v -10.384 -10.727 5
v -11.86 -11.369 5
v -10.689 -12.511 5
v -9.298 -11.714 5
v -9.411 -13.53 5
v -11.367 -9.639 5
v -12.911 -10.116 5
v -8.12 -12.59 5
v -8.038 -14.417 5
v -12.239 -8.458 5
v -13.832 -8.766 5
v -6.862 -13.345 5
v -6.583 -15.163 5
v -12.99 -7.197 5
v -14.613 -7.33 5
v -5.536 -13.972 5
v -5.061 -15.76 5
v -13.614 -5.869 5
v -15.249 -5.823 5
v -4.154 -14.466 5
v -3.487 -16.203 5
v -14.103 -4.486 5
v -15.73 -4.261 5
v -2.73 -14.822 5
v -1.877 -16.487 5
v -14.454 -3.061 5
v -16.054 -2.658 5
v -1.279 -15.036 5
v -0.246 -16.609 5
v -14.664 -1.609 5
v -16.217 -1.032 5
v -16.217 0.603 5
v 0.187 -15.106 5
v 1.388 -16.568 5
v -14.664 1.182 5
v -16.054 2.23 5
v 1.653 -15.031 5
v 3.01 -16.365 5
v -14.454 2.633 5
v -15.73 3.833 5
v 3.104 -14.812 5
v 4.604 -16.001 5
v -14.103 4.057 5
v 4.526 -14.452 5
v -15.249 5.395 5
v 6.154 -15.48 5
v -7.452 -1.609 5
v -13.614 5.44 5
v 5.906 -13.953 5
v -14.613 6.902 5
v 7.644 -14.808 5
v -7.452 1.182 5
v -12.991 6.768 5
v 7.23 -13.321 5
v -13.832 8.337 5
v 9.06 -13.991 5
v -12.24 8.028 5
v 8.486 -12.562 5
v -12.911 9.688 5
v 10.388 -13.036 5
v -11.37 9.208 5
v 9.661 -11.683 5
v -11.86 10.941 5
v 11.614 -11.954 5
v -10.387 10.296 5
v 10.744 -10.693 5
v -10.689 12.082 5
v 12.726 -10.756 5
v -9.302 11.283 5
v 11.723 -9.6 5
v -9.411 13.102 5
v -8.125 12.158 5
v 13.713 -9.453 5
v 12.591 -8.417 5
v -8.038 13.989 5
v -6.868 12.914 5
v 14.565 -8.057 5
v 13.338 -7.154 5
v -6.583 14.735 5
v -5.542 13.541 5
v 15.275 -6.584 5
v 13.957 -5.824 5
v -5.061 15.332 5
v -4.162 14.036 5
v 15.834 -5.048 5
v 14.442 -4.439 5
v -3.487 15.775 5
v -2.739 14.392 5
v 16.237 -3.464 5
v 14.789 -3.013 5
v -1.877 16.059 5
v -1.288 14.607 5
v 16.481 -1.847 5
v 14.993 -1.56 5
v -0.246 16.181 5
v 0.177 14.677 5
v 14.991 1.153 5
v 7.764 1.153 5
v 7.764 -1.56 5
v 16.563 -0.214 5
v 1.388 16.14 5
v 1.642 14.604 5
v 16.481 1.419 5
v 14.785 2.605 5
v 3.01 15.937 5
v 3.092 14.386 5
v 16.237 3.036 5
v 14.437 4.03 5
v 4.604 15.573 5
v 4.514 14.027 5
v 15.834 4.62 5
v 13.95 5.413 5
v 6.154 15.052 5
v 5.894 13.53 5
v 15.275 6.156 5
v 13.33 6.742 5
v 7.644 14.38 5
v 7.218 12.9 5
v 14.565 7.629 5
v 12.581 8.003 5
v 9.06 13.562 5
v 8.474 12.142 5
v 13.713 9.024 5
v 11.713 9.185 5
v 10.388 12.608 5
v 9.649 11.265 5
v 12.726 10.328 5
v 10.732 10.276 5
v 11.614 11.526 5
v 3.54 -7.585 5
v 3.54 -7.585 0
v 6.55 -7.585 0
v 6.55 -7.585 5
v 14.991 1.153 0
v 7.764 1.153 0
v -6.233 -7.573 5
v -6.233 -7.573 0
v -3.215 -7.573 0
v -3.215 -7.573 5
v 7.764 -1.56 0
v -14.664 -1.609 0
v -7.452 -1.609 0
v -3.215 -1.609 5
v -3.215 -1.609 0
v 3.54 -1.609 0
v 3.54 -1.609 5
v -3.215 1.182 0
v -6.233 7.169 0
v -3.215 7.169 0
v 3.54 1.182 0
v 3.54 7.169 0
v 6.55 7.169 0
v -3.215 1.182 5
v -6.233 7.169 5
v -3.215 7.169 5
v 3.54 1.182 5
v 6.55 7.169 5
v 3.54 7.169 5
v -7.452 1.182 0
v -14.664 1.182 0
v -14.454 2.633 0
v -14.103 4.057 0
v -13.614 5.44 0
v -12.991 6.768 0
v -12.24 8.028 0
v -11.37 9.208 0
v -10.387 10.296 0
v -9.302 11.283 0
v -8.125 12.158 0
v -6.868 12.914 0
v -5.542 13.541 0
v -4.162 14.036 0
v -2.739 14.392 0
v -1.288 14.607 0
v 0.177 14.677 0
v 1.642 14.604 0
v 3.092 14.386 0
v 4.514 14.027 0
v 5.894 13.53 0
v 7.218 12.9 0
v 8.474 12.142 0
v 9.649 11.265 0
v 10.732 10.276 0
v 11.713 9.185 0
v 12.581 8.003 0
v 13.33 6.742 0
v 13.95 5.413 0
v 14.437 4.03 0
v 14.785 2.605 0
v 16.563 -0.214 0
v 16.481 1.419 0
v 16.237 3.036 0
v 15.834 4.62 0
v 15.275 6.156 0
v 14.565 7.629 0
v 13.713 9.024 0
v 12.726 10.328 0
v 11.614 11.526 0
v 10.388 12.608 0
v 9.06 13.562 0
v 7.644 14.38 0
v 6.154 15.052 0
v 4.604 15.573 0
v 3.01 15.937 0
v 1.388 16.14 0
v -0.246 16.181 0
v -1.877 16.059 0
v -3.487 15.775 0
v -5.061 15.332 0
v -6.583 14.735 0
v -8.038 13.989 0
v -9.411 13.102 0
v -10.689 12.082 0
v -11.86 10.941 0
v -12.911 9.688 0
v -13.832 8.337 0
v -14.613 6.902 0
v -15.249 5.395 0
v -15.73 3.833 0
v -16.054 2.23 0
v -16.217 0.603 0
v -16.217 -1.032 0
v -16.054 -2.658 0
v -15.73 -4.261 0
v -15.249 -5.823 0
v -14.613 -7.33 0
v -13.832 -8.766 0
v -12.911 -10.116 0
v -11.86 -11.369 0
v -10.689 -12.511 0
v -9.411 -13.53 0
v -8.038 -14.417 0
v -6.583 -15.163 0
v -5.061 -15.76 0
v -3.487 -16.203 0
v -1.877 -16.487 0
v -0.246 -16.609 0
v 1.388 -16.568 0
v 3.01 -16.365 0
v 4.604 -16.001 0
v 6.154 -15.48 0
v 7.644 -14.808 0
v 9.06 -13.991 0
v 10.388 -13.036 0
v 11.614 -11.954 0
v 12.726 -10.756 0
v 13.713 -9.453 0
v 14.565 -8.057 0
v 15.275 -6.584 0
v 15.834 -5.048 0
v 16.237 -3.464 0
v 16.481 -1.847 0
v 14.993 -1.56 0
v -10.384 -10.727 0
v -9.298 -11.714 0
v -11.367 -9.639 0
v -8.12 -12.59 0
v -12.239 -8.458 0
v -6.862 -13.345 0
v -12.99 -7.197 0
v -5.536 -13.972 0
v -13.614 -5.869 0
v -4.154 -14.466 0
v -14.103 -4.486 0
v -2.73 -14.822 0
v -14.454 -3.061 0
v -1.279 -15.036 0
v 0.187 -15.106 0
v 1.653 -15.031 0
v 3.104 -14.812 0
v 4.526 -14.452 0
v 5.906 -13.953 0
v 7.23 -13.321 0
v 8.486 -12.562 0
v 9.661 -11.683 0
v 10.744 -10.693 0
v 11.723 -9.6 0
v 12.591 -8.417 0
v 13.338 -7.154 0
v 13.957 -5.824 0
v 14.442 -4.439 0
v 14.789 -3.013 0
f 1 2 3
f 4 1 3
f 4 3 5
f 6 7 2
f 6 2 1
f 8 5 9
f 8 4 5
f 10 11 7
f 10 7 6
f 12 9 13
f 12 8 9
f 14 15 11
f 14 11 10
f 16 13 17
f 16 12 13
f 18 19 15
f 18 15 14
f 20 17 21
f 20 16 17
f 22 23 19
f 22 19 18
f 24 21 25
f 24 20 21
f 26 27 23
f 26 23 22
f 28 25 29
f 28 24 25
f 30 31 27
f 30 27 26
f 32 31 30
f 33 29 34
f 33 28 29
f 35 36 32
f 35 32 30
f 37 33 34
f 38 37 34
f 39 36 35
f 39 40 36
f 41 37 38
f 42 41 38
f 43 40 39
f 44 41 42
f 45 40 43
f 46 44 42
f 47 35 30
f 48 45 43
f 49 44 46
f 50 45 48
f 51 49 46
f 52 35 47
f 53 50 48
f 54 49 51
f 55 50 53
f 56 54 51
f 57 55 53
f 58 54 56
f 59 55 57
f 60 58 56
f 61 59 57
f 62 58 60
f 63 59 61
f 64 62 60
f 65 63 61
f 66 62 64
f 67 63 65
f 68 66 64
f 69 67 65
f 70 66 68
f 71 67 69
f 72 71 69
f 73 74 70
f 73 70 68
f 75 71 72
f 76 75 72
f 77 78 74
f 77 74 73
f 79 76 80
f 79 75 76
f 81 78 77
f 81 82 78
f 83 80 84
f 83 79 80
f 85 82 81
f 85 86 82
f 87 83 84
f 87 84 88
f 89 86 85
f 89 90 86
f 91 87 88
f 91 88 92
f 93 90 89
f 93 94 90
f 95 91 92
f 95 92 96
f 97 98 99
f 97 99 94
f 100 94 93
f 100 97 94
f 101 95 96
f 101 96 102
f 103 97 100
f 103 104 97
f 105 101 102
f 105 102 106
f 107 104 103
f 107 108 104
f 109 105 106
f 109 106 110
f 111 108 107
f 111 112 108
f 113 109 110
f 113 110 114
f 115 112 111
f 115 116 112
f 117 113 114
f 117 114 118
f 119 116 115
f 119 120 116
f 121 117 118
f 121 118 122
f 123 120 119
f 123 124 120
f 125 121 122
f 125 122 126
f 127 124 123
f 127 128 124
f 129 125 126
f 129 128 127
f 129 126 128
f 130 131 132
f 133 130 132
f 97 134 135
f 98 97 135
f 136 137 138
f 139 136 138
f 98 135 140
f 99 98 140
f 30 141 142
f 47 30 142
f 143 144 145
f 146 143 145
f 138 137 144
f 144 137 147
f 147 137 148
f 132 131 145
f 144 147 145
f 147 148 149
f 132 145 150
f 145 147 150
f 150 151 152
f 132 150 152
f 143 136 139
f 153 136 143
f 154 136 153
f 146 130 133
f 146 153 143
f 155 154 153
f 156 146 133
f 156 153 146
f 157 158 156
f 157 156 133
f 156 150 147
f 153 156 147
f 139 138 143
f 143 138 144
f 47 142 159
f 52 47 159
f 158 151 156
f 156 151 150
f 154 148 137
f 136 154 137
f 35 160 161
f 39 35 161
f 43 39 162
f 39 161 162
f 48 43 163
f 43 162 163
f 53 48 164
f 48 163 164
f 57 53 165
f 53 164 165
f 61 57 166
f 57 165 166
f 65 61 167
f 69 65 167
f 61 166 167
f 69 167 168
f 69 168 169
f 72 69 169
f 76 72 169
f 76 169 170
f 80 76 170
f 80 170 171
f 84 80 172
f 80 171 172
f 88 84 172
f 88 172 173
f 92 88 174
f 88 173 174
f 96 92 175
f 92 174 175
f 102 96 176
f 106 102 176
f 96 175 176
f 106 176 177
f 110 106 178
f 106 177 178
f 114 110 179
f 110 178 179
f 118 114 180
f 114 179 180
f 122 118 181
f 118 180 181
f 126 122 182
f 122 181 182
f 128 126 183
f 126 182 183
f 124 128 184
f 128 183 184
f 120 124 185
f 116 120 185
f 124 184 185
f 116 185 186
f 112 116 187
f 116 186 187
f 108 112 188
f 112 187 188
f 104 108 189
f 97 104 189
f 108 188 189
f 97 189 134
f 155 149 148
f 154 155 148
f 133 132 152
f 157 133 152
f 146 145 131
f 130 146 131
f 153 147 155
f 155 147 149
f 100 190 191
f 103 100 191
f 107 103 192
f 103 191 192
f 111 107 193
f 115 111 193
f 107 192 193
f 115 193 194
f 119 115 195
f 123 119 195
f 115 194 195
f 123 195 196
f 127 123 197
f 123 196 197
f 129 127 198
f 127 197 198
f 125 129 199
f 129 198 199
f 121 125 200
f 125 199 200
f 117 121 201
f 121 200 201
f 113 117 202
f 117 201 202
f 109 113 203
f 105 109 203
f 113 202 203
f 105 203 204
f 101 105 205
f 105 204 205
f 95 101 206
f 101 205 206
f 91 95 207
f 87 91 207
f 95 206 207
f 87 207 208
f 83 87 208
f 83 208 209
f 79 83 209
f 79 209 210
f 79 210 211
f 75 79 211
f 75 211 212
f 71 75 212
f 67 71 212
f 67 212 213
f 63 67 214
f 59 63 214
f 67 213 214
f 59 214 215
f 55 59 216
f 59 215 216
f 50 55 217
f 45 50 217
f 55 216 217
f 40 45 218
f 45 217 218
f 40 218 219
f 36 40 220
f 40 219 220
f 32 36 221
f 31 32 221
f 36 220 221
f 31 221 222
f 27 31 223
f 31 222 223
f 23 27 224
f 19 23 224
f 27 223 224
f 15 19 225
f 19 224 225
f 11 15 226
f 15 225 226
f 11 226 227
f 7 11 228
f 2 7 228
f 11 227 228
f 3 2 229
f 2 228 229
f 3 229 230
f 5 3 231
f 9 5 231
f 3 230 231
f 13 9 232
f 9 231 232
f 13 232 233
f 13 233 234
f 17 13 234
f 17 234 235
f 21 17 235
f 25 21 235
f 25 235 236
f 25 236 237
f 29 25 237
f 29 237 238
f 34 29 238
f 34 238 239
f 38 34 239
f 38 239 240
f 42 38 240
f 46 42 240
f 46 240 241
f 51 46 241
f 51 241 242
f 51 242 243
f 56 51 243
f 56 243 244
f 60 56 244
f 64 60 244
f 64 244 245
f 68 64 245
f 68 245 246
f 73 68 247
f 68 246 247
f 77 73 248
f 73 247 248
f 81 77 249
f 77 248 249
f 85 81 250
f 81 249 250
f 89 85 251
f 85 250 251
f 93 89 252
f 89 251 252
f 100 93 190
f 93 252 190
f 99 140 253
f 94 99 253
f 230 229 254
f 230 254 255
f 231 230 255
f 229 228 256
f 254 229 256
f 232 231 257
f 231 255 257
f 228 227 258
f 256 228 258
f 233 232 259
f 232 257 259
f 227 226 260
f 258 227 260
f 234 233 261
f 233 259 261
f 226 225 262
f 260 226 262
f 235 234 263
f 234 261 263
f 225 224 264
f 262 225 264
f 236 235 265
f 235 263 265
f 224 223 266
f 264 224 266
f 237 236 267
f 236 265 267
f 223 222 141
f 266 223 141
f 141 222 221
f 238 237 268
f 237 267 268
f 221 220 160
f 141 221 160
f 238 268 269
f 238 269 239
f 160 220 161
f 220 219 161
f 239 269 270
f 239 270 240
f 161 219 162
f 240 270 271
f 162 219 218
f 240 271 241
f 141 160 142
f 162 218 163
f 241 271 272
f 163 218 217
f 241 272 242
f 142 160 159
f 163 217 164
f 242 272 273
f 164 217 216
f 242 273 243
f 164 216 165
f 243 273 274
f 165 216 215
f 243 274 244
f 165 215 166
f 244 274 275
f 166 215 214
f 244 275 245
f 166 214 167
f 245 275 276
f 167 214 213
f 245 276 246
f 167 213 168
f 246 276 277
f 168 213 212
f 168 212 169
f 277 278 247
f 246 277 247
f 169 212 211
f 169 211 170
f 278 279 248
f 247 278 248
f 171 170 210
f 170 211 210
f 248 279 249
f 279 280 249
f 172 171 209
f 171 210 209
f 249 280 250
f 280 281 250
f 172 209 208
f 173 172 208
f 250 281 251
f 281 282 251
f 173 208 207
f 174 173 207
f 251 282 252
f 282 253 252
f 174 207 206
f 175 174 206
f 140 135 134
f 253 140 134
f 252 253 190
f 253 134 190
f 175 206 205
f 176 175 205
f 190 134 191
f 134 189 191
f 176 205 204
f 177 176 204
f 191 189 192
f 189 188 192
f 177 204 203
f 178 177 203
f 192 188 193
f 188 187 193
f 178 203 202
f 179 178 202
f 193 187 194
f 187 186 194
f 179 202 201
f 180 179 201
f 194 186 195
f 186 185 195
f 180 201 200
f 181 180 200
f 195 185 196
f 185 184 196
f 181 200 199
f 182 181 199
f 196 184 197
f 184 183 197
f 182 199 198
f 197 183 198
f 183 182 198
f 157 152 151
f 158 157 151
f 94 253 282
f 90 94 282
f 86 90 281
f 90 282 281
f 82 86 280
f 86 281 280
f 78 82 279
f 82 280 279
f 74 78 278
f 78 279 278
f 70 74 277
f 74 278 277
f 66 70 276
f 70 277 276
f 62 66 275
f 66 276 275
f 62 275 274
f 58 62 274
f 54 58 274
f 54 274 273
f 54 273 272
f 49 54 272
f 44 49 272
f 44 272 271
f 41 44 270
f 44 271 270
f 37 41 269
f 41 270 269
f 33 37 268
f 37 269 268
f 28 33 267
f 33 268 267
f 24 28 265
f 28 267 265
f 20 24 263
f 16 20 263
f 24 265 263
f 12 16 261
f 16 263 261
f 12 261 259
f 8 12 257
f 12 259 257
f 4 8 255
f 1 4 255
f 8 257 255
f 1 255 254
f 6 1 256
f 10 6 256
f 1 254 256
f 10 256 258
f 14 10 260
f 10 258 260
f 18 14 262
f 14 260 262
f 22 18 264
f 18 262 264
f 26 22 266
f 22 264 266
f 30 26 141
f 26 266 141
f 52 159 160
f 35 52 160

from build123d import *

# Parameters (mm, degrees)
F0_R     = 16.400052
F1_DEPTH = 5


with BuildPart() as f1:
    # F0 (on Top) → F1 (new body)
    with BuildSketch(Plane.XY):
        with Locations((0.162477, -0.214076)):
            Circle(F0_R)
        with BuildLine():
            ThreePointArc((14.991158, 1.152792), (15.038298, 0.47008), (15.054022, -0.214076))
            ThreePointArc((15.054022, -0.214076), (15.038785, -0.887567), (14.993103, -1.55968))
            ThreePointArc((14.993103, -1.55968), (0.187112, -15.105601), (-14.663615, -1.60874))
            ThreePointArc((-14.663615, -1.60874), (-14.729068, -0.213591), (-14.663524, 1.181554))
            ThreePointArc((-14.663524, 1.181554), (0.176921, 14.677462), (14.991158, 1.152792))
        make_face(mode=Mode.SUBTRACT)
        Polygon((-3.215072, -7.572618), (-3.215072, -1.60874), (3.540387, -1.60874), (3.540387, -7.585416), (6.550414, -7.585416), (6.550414, 7.16865), (3.540387, 7.16865), (3.540387, 1.181554), (-3.215072, 1.181554), (-3.215072, 7.16865), (-6.232549, 7.16865), (-6.232549, -7.572618), align=None)
        with BuildLine():
            ThreePointArc((14.993103, -1.55968), (15.038785, -0.887567), (15.054022, -0.214076))
            ThreePointArc((15.054022, -0.214076), (15.038298, 0.47008), (14.991158, 1.152792))
            Line((14.991158, 1.152792), (7.763886, 1.152792))
            Line((7.763886, 1.152792), (7.763886, -1.55968))
            Line((7.763886, -1.55968), (14.993103, -1.55968))
        make_face()
        with BuildLine():
            Line((-7.451603, 1.181554), (-14.663524, 1.181554))
            ThreePointArc((-14.663524, 1.181554), (-14.729068, -0.213591), (-14.663615, -1.60874))
            Line((-14.663615, -1.60874), (-7.451603, -1.60874))
            Line((-7.451603, -1.60874), (-7.451603, 1.181554))
        make_face()
    extrude(amount=F1_DEPTH)


solid = f1.part
